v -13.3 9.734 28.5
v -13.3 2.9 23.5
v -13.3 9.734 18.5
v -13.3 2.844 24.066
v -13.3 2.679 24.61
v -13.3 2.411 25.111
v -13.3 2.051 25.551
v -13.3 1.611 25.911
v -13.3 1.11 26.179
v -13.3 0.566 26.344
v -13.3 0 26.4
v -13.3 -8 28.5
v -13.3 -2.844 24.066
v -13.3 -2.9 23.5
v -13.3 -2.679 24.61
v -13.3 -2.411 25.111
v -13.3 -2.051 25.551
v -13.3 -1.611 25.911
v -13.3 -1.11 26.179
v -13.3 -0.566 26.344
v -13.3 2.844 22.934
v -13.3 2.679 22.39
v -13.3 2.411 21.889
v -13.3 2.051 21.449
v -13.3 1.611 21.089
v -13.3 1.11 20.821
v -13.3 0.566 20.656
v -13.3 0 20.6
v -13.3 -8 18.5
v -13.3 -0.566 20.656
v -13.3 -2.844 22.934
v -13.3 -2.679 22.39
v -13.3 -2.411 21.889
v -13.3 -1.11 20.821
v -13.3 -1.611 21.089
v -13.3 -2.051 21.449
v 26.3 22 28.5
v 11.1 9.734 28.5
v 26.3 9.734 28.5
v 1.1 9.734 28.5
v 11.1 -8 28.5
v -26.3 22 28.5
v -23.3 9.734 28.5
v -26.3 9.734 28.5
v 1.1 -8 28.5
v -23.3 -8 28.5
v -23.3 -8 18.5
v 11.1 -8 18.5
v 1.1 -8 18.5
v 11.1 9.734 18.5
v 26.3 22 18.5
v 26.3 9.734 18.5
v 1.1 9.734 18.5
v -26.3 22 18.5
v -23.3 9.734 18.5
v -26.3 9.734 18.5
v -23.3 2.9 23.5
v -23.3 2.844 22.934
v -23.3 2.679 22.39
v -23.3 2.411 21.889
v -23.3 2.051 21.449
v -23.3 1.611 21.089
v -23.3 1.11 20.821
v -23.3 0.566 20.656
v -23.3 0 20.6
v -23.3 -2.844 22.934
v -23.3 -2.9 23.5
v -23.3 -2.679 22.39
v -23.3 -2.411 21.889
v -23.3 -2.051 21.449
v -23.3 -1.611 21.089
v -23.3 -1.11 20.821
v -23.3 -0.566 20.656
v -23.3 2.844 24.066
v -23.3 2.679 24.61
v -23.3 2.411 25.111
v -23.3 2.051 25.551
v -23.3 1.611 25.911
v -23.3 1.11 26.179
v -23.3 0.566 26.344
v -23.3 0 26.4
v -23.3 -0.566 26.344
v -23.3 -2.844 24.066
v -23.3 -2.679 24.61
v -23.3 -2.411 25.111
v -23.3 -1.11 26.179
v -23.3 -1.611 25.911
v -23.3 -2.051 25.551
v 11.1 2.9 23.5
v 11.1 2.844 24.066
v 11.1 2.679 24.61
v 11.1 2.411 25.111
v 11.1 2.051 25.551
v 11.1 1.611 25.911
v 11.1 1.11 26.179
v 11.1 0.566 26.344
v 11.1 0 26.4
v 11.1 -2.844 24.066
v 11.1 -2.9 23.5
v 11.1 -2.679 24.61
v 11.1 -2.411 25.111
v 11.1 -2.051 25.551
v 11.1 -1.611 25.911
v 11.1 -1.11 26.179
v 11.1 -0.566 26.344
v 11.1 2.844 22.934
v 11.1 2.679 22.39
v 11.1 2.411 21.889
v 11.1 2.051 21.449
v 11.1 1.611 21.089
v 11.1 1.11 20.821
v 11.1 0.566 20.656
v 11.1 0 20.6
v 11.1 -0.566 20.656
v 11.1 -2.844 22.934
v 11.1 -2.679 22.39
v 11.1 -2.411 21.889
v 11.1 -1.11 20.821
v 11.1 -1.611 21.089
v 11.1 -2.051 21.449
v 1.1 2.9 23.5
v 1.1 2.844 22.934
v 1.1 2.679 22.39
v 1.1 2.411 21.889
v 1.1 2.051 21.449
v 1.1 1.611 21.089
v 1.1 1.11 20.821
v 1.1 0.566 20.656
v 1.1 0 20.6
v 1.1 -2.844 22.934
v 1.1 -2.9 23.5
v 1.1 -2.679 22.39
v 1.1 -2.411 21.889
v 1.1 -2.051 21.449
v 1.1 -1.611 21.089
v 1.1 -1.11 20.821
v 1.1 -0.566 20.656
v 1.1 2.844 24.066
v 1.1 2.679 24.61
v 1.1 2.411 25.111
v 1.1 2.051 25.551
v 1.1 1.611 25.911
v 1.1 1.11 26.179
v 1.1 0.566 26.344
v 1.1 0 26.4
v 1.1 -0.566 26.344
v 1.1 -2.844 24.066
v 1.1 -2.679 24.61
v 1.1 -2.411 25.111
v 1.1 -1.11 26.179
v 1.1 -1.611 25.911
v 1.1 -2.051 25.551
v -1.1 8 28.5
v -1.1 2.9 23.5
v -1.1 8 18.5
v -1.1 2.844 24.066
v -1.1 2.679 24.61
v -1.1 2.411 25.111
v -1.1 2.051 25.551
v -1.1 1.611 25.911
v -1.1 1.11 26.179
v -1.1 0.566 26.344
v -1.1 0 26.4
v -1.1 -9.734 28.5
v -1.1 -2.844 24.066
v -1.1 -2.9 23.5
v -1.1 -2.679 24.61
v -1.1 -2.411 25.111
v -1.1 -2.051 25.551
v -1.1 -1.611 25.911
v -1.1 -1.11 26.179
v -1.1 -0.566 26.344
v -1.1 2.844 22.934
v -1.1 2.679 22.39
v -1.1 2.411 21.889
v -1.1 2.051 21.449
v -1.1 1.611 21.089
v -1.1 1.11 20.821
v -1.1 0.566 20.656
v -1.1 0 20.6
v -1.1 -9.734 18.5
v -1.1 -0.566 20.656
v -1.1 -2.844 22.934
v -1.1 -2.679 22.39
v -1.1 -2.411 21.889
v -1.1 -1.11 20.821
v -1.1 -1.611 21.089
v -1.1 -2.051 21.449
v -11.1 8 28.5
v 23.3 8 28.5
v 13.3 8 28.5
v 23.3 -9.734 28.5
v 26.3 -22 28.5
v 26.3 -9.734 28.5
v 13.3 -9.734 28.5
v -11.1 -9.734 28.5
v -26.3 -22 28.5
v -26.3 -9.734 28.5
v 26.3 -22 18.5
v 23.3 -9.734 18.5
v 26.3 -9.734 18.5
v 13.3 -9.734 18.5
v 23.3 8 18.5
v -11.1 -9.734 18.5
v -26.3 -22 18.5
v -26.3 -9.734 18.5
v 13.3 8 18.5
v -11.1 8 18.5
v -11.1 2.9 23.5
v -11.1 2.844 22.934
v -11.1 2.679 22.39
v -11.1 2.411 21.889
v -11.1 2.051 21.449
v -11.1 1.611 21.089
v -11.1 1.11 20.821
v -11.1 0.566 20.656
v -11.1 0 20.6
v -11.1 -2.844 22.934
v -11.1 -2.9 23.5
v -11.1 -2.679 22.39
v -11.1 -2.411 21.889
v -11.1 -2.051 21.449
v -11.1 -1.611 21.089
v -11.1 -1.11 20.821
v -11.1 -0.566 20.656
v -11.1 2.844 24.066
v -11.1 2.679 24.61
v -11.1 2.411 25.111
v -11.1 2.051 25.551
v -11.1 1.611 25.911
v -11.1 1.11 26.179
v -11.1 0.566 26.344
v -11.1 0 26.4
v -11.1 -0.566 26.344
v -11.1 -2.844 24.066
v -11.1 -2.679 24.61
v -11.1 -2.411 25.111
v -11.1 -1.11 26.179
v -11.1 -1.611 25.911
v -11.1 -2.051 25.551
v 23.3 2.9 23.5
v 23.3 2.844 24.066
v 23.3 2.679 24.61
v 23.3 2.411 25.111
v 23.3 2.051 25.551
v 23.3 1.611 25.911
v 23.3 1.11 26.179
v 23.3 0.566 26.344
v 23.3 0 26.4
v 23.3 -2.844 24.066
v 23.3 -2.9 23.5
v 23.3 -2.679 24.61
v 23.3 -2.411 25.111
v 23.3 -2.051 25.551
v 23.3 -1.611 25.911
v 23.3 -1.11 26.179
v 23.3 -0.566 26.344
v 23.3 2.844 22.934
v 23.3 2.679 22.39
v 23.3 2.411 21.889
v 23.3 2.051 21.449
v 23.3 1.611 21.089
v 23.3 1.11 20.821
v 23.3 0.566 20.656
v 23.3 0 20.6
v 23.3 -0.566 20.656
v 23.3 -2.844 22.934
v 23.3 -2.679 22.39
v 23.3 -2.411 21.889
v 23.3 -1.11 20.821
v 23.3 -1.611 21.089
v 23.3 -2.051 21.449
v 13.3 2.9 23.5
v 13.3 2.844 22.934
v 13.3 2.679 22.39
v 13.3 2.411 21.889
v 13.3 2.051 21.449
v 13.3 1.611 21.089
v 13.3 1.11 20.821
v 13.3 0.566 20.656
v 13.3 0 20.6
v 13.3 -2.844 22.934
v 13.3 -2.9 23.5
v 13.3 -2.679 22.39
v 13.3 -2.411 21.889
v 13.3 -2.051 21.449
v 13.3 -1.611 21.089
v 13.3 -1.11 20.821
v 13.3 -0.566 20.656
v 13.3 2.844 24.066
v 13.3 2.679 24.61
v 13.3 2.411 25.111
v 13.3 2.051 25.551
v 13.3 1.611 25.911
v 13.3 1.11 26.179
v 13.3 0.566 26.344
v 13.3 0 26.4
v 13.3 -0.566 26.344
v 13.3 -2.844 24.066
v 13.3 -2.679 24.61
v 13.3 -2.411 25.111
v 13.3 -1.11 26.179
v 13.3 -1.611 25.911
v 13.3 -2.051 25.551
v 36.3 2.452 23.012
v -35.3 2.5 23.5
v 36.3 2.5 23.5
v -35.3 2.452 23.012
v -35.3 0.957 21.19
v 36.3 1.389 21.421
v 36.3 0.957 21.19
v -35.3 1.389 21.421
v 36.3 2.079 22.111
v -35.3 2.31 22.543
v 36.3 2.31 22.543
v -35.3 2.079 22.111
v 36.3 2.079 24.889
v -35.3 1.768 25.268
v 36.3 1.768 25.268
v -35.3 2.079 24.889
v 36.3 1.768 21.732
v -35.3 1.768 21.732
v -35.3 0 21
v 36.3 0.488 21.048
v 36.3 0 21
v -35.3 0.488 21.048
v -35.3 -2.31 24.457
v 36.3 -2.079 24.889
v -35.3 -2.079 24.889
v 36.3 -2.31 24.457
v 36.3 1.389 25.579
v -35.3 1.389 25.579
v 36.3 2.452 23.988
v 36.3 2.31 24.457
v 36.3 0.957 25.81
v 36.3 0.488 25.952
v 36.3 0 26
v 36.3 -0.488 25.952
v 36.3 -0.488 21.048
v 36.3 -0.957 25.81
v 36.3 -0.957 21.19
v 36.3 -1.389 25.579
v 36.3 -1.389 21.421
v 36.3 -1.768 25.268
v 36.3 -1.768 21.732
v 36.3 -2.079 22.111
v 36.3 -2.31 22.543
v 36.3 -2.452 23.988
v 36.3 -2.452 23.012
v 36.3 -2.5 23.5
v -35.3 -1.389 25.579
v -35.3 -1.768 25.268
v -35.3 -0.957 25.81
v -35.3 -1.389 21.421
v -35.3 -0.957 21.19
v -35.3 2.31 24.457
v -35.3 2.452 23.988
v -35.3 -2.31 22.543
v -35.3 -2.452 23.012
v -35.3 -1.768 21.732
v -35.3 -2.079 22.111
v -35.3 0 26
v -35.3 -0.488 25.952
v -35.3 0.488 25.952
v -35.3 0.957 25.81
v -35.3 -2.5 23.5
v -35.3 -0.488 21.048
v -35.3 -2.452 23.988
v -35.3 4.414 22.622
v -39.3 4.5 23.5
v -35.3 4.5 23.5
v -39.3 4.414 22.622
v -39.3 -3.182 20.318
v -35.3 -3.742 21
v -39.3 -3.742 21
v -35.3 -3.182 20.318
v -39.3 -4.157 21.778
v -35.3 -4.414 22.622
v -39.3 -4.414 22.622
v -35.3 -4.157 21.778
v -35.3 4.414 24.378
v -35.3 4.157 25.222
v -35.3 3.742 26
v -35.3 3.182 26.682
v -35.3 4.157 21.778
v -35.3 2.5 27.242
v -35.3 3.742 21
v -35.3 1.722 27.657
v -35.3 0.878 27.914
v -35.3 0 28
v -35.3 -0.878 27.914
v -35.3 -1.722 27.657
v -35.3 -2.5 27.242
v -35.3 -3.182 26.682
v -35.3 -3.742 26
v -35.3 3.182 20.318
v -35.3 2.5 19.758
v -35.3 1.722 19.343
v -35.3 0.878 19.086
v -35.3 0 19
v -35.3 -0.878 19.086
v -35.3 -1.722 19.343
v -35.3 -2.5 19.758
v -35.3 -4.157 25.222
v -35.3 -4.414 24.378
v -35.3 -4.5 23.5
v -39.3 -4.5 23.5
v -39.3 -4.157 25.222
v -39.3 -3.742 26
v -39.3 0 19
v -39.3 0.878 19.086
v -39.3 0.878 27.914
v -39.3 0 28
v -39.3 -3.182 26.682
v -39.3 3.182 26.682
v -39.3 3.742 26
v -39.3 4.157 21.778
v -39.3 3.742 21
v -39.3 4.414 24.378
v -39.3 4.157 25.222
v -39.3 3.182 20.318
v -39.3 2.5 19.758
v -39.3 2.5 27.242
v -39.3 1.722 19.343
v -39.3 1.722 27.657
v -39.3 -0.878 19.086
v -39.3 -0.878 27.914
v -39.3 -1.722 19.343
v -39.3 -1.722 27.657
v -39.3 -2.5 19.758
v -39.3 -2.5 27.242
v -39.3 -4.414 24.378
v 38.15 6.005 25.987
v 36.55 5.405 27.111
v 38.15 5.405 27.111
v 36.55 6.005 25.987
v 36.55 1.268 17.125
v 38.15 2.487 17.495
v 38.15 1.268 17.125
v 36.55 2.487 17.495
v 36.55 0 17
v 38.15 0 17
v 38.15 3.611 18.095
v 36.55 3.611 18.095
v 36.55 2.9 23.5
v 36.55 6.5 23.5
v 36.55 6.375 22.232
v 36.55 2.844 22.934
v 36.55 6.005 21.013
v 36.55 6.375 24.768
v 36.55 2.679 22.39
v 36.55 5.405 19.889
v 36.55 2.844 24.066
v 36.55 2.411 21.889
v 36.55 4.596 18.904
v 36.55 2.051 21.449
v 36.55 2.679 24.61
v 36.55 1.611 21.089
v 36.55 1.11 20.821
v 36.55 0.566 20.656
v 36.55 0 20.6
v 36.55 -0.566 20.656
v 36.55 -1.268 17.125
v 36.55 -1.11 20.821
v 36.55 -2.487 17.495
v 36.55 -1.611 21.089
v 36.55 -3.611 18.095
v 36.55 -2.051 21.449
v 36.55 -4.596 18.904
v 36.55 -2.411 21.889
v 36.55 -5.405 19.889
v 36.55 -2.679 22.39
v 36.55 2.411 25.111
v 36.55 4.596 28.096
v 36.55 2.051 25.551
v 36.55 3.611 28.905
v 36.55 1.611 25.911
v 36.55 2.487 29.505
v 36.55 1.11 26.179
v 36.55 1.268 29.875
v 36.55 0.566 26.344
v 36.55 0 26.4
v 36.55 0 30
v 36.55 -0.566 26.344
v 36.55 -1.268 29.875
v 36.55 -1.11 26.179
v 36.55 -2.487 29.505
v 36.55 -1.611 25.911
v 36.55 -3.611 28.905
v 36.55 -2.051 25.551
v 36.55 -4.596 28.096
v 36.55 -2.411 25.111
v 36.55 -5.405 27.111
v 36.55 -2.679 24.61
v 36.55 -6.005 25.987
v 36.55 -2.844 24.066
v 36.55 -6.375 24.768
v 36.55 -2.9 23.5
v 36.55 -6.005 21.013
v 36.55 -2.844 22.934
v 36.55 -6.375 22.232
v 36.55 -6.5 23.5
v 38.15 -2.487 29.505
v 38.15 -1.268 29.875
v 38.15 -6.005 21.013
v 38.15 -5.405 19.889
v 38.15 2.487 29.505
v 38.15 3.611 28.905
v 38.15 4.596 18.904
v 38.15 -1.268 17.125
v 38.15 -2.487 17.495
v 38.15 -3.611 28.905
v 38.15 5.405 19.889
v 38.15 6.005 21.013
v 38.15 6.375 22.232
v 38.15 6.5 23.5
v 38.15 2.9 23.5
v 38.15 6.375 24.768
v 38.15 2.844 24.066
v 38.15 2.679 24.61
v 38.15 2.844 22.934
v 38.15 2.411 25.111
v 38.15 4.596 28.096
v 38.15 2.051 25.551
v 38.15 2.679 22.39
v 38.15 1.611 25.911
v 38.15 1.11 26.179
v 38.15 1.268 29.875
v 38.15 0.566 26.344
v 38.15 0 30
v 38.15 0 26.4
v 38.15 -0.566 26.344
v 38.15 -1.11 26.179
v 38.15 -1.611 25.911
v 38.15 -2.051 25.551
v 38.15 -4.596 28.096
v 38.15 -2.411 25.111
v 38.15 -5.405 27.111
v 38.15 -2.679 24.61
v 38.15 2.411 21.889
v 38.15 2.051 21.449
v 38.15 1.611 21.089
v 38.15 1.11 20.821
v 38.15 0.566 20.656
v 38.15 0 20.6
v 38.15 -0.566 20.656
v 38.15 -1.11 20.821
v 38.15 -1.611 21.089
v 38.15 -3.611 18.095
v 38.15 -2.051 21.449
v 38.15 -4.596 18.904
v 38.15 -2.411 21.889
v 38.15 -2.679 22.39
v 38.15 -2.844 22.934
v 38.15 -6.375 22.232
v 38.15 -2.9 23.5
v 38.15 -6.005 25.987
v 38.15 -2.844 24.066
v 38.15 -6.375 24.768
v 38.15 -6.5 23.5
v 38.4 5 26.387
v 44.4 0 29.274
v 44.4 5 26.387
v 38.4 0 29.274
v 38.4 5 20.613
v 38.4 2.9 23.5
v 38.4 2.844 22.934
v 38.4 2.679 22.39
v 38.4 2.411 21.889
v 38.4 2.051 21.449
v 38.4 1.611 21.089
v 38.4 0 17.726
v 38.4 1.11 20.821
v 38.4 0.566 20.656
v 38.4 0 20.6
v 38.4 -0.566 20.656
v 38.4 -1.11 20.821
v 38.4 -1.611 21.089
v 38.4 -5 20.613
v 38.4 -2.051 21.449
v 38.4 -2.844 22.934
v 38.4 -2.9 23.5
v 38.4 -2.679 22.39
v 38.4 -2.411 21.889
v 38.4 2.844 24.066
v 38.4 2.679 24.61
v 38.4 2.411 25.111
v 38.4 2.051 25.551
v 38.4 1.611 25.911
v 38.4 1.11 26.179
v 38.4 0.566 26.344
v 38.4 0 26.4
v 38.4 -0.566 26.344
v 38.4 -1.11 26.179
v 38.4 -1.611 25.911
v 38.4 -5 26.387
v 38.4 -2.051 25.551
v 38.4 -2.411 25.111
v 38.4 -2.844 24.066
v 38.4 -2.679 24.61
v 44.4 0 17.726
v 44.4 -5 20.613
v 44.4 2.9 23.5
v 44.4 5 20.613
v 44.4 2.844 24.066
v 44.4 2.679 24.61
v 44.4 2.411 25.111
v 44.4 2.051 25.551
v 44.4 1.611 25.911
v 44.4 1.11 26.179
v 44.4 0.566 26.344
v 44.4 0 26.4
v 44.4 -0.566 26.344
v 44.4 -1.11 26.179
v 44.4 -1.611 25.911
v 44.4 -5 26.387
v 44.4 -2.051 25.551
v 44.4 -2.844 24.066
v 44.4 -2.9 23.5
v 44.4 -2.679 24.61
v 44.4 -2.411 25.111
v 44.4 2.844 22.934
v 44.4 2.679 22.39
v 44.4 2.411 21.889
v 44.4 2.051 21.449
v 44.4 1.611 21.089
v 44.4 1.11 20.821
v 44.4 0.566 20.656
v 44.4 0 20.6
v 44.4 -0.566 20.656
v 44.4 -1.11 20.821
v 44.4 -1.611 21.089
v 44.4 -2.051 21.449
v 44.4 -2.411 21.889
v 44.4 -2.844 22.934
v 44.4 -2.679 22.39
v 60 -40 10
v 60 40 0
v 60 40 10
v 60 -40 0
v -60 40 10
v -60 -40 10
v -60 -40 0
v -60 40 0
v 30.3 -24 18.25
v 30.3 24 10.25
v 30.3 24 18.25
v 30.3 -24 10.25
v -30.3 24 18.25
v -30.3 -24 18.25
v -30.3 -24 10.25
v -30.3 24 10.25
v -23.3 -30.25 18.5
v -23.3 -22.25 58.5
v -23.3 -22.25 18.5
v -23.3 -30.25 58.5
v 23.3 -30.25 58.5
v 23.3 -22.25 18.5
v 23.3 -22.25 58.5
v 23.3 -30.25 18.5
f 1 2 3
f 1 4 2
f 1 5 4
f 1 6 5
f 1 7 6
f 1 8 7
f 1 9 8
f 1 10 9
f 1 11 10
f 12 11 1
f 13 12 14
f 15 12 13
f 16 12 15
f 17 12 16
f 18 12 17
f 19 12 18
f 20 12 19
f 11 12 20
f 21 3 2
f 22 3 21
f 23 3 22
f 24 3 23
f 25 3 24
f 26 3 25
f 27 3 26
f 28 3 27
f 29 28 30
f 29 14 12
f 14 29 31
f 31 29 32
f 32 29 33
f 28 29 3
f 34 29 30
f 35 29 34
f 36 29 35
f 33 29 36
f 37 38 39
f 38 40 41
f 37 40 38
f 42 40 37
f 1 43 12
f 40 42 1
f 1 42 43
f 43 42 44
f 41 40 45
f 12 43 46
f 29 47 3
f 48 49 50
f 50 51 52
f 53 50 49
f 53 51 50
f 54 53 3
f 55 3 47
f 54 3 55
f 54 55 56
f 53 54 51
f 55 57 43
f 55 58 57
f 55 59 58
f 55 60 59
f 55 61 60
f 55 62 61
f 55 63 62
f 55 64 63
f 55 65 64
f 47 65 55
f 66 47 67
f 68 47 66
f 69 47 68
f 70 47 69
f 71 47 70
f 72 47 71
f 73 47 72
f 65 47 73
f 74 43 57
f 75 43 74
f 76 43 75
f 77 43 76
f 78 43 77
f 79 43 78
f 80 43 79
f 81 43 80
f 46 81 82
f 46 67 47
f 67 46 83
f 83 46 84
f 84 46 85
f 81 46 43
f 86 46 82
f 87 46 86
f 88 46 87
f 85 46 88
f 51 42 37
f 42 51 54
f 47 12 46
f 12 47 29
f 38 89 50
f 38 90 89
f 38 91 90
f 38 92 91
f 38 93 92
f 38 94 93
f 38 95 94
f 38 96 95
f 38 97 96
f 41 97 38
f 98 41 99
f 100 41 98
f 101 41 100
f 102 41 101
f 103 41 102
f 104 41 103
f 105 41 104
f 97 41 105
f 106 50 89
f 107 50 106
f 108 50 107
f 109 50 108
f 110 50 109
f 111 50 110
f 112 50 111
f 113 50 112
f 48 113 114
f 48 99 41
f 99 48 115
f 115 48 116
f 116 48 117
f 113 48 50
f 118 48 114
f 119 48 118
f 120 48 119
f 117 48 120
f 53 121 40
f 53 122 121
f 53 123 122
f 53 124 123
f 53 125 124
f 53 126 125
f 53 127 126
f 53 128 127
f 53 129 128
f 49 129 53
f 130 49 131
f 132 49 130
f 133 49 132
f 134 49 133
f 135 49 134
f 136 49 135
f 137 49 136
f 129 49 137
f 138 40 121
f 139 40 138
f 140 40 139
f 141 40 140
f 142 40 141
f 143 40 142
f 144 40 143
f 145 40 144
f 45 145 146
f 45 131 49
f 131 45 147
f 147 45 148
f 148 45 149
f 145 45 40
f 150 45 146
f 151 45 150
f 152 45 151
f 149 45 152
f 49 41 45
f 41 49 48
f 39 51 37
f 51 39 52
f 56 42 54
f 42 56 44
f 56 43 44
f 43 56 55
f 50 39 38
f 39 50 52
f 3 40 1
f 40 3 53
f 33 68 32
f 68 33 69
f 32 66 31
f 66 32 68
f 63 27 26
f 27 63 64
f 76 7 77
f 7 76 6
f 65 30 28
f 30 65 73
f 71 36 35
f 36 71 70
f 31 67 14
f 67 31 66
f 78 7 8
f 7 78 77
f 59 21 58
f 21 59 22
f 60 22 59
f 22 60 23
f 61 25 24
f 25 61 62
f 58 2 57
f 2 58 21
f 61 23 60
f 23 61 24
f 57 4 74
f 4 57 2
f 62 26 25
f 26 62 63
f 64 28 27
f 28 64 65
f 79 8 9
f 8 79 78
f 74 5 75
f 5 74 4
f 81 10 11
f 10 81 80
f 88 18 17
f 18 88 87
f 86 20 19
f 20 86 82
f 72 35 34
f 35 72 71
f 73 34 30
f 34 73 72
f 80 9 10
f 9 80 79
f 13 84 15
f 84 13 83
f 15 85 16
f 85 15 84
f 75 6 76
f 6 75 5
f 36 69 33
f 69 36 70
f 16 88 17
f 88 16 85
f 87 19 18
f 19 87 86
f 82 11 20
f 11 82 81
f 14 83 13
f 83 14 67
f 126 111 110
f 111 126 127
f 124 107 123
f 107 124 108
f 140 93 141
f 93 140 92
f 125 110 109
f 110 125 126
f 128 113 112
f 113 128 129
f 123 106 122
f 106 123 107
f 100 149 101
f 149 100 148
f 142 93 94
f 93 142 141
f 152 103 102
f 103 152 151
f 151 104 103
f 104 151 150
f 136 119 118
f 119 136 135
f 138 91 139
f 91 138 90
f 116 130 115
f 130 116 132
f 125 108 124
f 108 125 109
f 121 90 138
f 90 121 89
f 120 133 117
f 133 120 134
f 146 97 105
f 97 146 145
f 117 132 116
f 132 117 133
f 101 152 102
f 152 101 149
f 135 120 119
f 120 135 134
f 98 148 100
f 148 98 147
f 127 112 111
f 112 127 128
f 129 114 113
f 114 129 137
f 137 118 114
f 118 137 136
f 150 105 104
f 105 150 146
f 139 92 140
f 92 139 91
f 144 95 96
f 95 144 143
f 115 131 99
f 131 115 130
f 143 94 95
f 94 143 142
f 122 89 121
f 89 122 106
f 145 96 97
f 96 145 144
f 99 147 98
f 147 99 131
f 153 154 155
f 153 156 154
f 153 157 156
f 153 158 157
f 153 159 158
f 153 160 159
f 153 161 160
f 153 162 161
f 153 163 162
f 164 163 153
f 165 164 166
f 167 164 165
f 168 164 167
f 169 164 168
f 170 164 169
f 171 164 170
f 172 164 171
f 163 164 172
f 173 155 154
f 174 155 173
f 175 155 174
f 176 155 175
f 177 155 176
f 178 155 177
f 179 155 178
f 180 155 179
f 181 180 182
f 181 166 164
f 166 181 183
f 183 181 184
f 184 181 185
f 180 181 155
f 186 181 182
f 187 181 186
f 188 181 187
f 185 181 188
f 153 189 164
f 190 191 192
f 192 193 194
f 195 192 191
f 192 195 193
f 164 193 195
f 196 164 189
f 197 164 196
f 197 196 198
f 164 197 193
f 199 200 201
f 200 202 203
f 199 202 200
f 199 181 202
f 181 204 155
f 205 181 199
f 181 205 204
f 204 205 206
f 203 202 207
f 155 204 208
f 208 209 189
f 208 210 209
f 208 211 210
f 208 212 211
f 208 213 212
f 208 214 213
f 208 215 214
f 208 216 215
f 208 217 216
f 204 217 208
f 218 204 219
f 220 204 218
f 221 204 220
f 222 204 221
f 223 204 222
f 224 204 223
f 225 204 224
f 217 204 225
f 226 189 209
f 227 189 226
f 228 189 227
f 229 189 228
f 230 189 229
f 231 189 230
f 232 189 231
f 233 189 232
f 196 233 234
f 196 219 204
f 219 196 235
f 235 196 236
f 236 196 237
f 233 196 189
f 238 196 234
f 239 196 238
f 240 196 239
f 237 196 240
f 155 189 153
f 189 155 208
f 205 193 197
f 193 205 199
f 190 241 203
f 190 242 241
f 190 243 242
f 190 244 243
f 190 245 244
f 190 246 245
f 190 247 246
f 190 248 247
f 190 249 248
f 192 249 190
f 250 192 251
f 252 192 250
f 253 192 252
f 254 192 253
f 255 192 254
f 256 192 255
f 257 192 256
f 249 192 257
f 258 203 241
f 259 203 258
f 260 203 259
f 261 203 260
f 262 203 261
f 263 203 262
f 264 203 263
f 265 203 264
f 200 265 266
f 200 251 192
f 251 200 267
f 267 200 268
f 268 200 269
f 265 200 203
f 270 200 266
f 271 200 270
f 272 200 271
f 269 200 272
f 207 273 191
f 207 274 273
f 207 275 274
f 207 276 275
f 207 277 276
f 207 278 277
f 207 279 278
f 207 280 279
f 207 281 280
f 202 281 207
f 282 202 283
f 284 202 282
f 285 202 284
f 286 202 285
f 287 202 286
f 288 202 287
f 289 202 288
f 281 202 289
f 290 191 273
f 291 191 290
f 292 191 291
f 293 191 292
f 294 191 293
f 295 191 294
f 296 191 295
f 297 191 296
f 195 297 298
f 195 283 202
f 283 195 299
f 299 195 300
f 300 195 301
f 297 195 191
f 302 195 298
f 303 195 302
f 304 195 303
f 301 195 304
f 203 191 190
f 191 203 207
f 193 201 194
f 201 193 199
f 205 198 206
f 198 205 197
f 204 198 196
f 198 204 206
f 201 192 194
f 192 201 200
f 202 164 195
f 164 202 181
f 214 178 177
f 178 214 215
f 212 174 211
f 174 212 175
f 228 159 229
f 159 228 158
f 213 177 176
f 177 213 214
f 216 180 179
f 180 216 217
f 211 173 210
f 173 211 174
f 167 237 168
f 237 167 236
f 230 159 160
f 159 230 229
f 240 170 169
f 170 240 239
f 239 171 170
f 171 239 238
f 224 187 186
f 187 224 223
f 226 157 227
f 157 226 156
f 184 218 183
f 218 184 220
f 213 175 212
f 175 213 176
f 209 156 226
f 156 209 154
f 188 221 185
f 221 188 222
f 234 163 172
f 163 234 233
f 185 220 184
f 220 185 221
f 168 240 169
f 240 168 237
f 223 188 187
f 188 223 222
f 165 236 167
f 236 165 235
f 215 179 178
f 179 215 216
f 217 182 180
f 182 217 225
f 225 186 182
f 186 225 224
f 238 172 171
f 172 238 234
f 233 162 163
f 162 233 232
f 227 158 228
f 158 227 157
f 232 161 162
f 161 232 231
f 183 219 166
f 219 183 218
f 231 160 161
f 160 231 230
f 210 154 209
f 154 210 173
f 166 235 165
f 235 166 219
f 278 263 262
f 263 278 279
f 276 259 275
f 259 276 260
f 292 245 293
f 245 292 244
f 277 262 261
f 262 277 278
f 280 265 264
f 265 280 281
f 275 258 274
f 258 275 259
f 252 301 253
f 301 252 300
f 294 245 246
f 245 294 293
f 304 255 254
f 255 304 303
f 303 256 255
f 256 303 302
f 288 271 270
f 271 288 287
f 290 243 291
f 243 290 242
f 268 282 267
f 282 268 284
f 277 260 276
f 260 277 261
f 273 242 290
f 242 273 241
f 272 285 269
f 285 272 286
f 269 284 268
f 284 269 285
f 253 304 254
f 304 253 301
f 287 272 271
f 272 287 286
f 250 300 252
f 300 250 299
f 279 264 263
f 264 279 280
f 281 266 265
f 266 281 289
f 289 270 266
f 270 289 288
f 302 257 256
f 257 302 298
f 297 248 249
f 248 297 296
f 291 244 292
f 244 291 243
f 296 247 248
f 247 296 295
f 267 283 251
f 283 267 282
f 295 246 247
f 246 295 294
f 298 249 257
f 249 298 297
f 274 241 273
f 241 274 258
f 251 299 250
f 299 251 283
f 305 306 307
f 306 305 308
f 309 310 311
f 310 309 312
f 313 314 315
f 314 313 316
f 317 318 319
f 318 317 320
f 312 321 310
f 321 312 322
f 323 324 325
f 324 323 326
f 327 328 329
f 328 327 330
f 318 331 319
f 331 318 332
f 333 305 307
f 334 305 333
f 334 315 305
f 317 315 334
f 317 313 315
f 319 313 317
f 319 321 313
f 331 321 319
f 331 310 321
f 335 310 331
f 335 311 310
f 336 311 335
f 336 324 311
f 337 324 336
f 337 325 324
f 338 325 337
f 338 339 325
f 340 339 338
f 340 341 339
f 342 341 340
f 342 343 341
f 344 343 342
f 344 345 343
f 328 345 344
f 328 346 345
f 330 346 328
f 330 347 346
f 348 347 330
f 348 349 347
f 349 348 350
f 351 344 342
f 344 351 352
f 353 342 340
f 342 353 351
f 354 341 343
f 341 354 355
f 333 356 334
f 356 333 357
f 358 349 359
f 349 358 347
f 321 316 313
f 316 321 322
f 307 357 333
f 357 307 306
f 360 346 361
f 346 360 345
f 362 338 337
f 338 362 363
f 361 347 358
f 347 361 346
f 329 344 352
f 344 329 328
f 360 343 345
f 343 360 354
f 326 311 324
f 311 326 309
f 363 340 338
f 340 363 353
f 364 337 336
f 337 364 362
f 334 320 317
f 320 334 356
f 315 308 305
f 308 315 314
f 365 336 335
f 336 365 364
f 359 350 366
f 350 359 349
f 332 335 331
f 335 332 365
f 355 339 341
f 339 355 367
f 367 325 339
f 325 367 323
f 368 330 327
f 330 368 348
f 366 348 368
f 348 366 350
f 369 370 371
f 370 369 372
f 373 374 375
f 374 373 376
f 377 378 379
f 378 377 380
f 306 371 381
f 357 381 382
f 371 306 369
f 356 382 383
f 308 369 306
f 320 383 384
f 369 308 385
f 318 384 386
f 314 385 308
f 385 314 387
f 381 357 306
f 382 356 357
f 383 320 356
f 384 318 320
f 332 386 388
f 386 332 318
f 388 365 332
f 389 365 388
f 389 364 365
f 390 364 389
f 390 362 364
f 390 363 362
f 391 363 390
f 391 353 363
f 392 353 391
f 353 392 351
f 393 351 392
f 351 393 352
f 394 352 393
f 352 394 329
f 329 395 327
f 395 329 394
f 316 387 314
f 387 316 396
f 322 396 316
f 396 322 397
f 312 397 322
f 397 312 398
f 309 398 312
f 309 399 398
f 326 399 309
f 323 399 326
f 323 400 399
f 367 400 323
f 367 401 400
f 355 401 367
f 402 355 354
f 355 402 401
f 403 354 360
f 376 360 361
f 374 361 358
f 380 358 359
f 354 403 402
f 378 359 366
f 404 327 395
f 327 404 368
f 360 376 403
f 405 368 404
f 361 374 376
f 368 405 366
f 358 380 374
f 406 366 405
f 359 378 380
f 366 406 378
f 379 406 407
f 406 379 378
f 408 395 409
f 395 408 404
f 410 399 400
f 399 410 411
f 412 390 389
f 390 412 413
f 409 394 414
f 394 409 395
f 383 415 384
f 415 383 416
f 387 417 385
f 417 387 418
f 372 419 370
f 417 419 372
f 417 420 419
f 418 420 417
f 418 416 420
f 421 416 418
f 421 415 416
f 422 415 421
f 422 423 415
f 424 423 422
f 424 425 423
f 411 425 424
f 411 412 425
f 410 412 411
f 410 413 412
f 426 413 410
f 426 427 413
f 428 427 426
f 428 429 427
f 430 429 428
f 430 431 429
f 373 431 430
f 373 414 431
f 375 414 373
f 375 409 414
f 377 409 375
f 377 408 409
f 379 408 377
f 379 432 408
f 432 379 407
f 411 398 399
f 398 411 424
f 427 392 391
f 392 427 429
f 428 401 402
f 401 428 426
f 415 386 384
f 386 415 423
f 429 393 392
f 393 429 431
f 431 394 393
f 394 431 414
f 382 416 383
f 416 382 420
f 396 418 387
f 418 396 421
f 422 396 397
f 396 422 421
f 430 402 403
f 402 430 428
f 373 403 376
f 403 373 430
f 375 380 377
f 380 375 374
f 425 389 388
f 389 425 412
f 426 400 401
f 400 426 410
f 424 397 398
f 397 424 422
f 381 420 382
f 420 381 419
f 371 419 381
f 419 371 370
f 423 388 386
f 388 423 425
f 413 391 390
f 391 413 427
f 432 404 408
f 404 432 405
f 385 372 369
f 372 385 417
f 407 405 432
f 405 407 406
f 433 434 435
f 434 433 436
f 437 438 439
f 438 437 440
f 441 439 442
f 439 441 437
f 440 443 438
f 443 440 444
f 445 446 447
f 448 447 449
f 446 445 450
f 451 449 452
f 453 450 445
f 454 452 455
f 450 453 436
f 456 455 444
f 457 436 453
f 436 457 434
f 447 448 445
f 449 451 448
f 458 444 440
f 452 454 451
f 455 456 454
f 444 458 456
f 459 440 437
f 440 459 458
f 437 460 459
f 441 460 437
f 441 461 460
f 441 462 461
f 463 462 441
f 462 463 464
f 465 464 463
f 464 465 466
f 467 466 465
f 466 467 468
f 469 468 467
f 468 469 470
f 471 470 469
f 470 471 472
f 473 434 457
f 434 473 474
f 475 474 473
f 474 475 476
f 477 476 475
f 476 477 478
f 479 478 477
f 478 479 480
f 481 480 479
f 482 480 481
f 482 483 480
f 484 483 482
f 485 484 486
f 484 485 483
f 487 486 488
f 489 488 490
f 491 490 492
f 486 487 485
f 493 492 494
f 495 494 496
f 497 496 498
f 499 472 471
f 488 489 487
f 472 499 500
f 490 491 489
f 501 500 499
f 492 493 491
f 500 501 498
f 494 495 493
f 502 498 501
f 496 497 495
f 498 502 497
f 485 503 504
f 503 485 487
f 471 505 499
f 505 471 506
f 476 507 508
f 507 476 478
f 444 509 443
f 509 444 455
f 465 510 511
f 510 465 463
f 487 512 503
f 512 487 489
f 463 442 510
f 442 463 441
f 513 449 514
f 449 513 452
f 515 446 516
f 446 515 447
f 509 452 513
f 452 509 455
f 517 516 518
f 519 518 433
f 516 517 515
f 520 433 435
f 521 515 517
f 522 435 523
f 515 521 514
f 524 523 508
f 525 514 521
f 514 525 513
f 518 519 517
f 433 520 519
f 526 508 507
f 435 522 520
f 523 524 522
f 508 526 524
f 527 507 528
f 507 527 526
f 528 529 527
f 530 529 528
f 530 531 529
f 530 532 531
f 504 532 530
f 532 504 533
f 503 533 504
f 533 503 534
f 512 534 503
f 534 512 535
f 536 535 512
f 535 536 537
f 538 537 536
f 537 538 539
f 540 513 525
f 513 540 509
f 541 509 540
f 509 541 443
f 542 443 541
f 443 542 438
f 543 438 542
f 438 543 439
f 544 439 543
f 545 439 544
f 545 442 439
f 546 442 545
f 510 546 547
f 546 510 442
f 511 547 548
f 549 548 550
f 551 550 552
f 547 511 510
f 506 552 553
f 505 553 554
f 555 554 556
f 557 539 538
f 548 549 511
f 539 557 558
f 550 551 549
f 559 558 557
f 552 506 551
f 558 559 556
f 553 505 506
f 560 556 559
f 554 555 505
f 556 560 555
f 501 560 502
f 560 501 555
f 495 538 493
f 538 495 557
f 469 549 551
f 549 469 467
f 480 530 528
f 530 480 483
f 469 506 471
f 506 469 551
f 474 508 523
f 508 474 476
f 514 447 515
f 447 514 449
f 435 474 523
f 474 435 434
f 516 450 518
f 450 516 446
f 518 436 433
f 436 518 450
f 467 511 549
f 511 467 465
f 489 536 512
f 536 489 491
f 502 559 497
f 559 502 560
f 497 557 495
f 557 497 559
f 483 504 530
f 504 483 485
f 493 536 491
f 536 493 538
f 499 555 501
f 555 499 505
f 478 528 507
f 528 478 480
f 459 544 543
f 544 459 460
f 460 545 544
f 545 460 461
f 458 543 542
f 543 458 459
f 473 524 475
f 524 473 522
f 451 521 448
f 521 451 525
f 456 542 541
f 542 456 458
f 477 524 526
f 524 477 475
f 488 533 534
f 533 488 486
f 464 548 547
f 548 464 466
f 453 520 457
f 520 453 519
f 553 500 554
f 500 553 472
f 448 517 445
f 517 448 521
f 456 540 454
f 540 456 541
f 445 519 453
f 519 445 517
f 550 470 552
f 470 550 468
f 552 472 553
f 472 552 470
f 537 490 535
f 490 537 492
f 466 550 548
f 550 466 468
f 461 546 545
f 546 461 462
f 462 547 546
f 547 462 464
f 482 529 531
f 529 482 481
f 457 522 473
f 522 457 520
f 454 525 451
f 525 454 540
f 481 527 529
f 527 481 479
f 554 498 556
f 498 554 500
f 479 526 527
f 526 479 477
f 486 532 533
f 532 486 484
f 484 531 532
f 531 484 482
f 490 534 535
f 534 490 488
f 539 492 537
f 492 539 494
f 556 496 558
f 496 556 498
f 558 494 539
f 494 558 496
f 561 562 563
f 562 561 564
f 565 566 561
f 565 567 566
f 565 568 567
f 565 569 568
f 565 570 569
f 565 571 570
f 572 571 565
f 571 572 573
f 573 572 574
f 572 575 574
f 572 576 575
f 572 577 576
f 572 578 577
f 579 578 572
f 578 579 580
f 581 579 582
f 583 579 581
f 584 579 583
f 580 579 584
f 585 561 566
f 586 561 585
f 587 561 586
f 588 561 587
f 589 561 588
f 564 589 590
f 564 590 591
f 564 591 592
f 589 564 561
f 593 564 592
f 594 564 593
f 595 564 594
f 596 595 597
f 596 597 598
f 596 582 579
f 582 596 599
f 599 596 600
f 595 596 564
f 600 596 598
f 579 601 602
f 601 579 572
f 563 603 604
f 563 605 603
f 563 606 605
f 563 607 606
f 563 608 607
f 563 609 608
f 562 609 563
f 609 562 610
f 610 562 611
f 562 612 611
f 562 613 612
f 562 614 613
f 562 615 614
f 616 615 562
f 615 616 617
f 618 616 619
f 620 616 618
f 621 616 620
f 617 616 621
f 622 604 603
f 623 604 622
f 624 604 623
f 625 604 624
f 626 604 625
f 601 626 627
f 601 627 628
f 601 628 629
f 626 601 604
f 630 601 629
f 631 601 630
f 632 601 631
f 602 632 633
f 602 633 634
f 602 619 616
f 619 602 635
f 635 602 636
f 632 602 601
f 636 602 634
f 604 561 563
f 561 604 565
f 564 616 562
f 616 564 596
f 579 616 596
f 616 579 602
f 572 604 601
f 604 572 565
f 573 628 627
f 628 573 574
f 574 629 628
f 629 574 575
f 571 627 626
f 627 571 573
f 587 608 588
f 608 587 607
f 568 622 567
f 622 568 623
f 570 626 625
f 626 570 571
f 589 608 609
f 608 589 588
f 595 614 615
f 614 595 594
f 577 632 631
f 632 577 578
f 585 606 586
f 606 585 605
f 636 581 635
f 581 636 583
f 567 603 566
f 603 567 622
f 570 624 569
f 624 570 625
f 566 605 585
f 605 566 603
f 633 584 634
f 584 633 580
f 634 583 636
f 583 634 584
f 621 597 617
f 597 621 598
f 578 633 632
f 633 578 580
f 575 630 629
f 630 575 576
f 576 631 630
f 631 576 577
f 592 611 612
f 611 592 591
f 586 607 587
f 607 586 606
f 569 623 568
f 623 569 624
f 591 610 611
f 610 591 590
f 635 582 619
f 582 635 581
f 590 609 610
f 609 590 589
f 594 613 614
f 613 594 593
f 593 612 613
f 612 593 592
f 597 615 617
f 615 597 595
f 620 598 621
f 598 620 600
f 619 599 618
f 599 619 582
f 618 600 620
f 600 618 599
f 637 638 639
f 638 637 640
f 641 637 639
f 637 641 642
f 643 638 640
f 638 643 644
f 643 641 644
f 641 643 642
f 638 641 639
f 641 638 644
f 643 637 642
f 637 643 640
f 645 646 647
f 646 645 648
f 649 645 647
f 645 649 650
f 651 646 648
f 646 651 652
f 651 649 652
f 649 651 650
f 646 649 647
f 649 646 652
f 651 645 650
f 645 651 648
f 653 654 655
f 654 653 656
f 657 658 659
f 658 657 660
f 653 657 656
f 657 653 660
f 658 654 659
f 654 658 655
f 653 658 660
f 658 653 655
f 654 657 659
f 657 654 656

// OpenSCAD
$fn = 32;

// ------------------------------------------------------------------------
// Comb hinge with flap: leaf 52.6 x 22 mm, pin d5, flap 40 mm
// Every part is its own module, assembly() places every instance.
// ------------------------------------------------------------------------

// --- part 1 ---
module hinge_bed() {
  difference() {
    translate([-60, -40, 0]) cube([120, 80, 10]);
  }
}

// --- part 2 ---
module hinge_riser() {
  difference() {
    translate([-30.3, -24, 0]) cube([60.6, 48, 8]);
  }
}

// --- part 3 ---
module hinge_leaf_a() {
  difference() {
    union() {
      translate([-23.3, -8, -5]) cube([10, 30, 10]);
      translate([1.1, -8, -5]) cube([10, 30, 10]);
      translate([-26.3, 9.734, -5]) cube([52.6, 12.266, 10]);
    }
    translate([-18.3, 0, 0]) rotate([0, 90, 0]) cylinder(h = 12, d = 5.8, center = true);
    translate([6.1, 0, 0]) rotate([0, 90, 0]) cylinder(h = 12, d = 5.8, center = true);
  }
}

// --- part 4 ---
module hinge_leaf_b() {
  difference() {
    union() {
      translate([-11.1, -22, -5]) cube([10, 30, 10]);
      translate([13.3, -22, -5]) cube([10, 30, 10]);
      translate([-26.3, -22, -5]) cube([52.6, 12.266, 10]);
    }
    translate([-6.1, 0, 0]) rotate([0, 90, 0]) cylinder(h = 12, d = 5.8, center = true);
    translate([18.3, 0, 0]) rotate([0, 90, 0]) cylinder(h = 12, d = 5.8, center = true);
  }
}

// --- part 5 ---
module hinge_flap() {
  difference() {
    translate([-23.3, -20, 0]) cube([46.6, 40, 8]);
  }
}

// --- part 6 ---
module hinge_pin() {
  rotate([0, 90, 0]) cylinder(h = 72.6, d = 5, center = true);
  translate([-39.3, 0, 0]) rotate([0, 90, 0]) cylinder(h = 4, d = 9);
}

// --- part 7 ---
module pin_washer() {
  difference() {
      translate([0, 0, 0]) cylinder(h = 1.6, d = 13);
      translate([0, 0, -1]) cylinder(h = 3.6, d = 5.8);
    }
}

// --- part 8 ---
module pin_nut() {
  difference() {
    linear_extrude(height = 6) polygon(points = [[5.774, 0], [2.887, 5], [-2.887, 5], [-5.774, 0], [-2.887, -5], [2.887, -5]]);
    translate([0, 0, -1]) cylinder(h = 8, d = 5.8);
  }
}

// --- assembly ---
module assembly() {
  color([0.80, 0.24, 0.20]) translate([0, 0, 0]) rotate([0, 0, 0]) hinge_bed();
  color([0.20, 0.45, 0.75]) translate([0, 0, 10.25]) rotate([0, 0, 0]) hinge_riser();
  color([0.25, 0.62, 0.32]) translate([0, 0, 23.5]) rotate([0, 0, 0]) hinge_leaf_a();
  color([0.92, 0.70, 0.18]) translate([0, 0, 23.5]) rotate([0, 0, 0]) hinge_leaf_b();
  color([0.58, 0.35, 0.70]) translate([0, -22.25, 38.5]) rotate([90, 0, 0]) hinge_flap();
  color([0.16, 0.66, 0.66]) translate([0, 0, 23.5]) rotate([0, 0, 0]) hinge_pin();
  color([0.85, 0.48, 0.18]) translate([36.55, 0, 23.5]) rotate([0, 90, 0]) pin_washer();
  color([0.55, 0.60, 0.65]) translate([38.4, 0, 23.5]) rotate([0, 90, 0]) pin_nut();
}

assembly();
